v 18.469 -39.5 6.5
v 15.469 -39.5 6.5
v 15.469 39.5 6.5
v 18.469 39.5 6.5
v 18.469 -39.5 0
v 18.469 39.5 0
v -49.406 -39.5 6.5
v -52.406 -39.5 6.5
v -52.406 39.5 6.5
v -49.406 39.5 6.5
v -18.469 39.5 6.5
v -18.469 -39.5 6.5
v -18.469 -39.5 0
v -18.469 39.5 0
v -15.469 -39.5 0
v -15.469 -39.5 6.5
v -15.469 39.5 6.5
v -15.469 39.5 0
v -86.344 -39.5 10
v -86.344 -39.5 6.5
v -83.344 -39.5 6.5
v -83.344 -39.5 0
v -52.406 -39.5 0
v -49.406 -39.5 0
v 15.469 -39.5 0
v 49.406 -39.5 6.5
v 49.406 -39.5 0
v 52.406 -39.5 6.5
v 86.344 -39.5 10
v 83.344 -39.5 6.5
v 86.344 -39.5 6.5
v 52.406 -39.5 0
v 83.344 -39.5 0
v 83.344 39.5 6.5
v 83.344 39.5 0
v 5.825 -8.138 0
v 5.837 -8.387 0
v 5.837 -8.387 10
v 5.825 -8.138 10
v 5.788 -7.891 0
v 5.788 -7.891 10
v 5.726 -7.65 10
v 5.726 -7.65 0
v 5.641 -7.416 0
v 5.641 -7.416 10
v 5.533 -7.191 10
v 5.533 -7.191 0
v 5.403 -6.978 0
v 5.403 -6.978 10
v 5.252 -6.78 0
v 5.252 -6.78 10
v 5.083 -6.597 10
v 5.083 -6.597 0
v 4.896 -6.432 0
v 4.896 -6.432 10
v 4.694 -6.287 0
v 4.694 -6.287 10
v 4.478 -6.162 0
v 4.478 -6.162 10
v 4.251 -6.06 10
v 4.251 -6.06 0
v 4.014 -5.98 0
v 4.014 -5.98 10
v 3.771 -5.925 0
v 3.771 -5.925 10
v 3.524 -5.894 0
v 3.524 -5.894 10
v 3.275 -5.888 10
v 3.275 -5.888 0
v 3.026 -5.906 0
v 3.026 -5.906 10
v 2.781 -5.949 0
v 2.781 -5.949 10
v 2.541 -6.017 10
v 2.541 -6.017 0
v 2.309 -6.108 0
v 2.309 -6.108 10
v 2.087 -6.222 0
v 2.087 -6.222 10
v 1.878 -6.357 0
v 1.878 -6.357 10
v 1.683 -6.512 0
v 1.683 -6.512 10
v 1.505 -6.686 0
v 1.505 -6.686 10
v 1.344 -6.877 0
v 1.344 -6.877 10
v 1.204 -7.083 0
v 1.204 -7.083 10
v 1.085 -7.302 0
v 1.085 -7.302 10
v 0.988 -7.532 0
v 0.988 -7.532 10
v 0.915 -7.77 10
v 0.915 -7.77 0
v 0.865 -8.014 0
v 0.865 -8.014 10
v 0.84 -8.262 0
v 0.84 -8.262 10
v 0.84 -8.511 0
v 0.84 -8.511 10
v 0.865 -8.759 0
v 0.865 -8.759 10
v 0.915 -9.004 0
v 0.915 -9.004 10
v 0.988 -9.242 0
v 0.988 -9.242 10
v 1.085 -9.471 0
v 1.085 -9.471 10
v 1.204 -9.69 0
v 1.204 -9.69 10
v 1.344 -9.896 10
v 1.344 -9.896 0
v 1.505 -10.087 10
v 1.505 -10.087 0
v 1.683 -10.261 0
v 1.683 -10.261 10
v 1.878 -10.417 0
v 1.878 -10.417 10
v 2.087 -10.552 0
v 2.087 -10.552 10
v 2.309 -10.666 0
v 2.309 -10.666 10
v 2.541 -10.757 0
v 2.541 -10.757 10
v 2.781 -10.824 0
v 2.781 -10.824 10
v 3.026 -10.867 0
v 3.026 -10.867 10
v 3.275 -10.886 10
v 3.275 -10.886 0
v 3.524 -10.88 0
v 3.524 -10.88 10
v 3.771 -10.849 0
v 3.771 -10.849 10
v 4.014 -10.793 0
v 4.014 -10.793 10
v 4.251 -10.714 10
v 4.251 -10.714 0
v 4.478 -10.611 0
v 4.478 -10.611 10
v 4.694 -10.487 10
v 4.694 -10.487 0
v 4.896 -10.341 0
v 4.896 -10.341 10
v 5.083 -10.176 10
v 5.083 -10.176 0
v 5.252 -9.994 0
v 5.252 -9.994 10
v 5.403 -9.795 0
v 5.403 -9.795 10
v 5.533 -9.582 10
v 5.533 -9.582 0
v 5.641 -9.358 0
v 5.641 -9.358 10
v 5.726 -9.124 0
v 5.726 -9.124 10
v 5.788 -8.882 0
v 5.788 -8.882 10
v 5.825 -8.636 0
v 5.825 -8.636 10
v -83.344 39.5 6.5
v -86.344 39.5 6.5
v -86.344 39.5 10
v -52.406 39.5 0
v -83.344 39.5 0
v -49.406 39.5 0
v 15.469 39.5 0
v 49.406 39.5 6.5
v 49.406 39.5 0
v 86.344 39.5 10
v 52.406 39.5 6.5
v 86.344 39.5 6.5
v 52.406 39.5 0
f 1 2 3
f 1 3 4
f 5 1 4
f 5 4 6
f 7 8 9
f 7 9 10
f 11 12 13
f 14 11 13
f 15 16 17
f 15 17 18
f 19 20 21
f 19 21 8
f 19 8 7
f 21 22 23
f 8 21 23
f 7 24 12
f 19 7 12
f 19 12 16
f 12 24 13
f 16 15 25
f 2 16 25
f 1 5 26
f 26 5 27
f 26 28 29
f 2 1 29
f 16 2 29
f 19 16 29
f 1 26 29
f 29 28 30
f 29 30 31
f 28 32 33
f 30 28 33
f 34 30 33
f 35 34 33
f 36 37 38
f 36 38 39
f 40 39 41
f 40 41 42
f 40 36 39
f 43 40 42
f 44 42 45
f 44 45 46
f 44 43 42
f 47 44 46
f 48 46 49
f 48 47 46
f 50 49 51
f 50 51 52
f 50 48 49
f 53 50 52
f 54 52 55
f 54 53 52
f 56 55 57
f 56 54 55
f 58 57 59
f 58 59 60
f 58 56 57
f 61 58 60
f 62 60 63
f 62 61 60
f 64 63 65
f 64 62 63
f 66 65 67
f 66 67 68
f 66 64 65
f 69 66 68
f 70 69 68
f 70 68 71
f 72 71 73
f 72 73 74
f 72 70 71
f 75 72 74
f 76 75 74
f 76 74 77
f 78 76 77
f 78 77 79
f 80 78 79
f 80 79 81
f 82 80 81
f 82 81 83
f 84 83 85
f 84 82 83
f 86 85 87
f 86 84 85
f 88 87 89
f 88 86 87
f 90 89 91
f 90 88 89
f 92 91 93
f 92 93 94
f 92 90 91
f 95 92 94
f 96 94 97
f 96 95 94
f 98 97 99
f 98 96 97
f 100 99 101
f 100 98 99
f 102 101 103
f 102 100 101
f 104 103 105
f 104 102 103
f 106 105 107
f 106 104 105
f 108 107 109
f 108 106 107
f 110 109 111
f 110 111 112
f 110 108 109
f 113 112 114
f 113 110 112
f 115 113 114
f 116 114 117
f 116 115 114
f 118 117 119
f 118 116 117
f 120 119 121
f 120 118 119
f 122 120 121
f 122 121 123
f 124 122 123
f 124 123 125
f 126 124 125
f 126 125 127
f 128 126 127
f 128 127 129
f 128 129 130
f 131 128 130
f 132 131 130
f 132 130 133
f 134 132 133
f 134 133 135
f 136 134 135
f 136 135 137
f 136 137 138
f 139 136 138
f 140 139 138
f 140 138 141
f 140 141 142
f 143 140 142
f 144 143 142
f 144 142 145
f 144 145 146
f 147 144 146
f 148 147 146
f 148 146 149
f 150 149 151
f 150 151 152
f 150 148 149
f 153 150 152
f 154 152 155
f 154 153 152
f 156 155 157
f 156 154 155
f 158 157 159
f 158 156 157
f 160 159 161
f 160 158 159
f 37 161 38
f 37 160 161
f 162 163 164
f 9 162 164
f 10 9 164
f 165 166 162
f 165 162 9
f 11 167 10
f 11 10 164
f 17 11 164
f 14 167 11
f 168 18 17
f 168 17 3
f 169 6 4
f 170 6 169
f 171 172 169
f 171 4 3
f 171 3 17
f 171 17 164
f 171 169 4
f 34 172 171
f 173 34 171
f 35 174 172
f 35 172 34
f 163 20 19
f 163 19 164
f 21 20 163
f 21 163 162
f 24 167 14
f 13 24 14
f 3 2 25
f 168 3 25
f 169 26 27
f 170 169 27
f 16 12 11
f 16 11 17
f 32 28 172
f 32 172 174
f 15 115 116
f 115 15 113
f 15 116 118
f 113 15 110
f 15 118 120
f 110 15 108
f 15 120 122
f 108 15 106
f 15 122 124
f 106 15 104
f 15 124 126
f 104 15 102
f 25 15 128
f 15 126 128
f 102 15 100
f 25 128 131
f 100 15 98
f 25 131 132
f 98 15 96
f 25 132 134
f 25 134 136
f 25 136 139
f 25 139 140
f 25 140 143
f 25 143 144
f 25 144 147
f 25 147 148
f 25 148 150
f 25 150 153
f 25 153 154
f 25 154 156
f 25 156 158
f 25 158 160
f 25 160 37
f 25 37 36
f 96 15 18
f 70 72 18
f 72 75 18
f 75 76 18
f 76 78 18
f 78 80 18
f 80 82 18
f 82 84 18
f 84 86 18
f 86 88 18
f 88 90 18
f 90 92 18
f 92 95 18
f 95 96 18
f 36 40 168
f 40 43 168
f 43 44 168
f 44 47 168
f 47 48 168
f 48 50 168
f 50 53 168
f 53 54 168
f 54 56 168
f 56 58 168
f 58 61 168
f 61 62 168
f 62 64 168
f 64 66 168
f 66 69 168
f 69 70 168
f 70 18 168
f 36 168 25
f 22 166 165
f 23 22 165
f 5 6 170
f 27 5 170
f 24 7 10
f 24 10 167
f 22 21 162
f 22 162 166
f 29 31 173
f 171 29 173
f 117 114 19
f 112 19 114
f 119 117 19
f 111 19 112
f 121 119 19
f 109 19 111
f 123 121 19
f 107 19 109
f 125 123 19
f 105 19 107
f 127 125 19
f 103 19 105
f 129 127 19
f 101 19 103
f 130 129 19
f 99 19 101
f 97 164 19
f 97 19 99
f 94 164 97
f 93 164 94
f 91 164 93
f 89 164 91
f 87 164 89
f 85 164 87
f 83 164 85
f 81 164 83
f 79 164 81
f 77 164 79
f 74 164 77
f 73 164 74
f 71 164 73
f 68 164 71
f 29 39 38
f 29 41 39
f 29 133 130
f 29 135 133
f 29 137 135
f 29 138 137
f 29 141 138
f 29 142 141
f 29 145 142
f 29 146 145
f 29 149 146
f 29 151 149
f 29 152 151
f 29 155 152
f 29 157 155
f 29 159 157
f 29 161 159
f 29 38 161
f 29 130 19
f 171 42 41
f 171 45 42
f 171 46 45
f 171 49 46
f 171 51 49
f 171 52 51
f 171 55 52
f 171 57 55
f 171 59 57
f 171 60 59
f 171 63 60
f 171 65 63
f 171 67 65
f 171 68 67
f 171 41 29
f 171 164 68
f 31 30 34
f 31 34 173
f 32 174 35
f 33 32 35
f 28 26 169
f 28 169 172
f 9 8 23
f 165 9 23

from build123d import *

# Parameters (mm, degrees)
SKETCH1_W           = 172.688303012
SKETCH1_H           = 79
SKETCH1_R           = 2.5
BOSS_EXTRUDE1_DEPTH = 10
CUT_EXTRUDE1_REACH  = 81
SKETCH2_W           = 3
SKETCH2_H           = 6.5


with BuildPart() as part:
    # Sketch1 → Boss-Extrude1 (new body)
    with BuildSketch(Plane.XY):
        Rectangle(SKETCH1_W, SKETCH1_H)
        with Locations((3.337204705, -8.386778216)):
            Circle(SKETCH1_R, mode=Mode.SUBTRACT)
    extrude(amount=BOSS_EXTRUDE1_DEPTH)

    # Sketch2 → Cut-Extrude1 (cut, up to next)
    with BuildSketch(Plane(origin=(0, 39.5, 0), x_dir=(1, 0, 0), z_dir=(0, 1, 0)), mode=Mode.PRIVATE) as cut_extrude1_sk1:
        with Locations((84.844151506, -3.25)):
            Rectangle(SKETCH2_W, SKETCH2_H)
    cut_extrude1_tool1 = extrude(cut_extrude1_sk1.sketch, amount=-CUT_EXTRUDE1_REACH, mode=Mode.PRIVATE) & part.part
    add(cut_extrude1_tool1.solids().sort_by_distance((84.844152, 39.5, 3.25))[0], mode=Mode.SUBTRACT)
    # Sketch2 → Cut-Extrude1 (cut, up to next)
    with BuildSketch(Plane(origin=(0, 39.5, 0), x_dir=(1, 0, 0), z_dir=(0, 1, 0)), mode=Mode.PRIVATE) as cut_extrude1_sk2:
        with Locations((50.906490903, -3.25)):
            Rectangle(SKETCH2_W, SKETCH2_H)
    cut_extrude1_tool2 = extrude(cut_extrude1_sk2.sketch, amount=-CUT_EXTRUDE1_REACH, mode=Mode.PRIVATE) & part.part
    add(cut_extrude1_tool2.solids().sort_by_distance((50.906491, 39.5, 3.25))[0], mode=Mode.SUBTRACT)
    # Sketch2 → Cut-Extrude1 (cut, up to next)
    with BuildSketch(Plane(origin=(0, 39.5, 0), x_dir=(1, 0, 0), z_dir=(0, 1, 0)), mode=Mode.PRIVATE) as cut_extrude1_sk3:
        with Locations((16.968830301, -3.25)):
            Rectangle(SKETCH2_W, SKETCH2_H)
    cut_extrude1_tool3 = extrude(cut_extrude1_sk3.sketch, amount=-CUT_EXTRUDE1_REACH, mode=Mode.PRIVATE) & part.part
    add(cut_extrude1_tool3.solids().sort_by_distance((16.96883, 39.5, 3.25))[0], mode=Mode.SUBTRACT)
    # Sketch2 → Cut-Extrude1 (cut, up to next)
    with BuildSketch(Plane(origin=(0, 39.5, 0), x_dir=(1, 0, 0), z_dir=(0, 1, 0)), mode=Mode.PRIVATE) as cut_extrude1_sk4:
        with Locations((-16.968830301, -3.25)):
            Rectangle(SKETCH2_W, SKETCH2_H)
    cut_extrude1_tool4 = extrude(cut_extrude1_sk4.sketch, amount=-CUT_EXTRUDE1_REACH, mode=Mode.PRIVATE) & part.part
    add(cut_extrude1_tool4.solids().sort_by_distance((-16.96883, 39.5, 3.25))[0], mode=Mode.SUBTRACT)
    # Sketch2 → Cut-Extrude1 (cut, up to next)
    with BuildSketch(Plane(origin=(0, 39.5, 0), x_dir=(1, 0, 0), z_dir=(0, 1, 0)), mode=Mode.PRIVATE) as cut_extrude1_sk5:
        with Locations((-50.906490903, -3.25)):
            Rectangle(SKETCH2_W, SKETCH2_H)
    cut_extrude1_tool5 = extrude(cut_extrude1_sk5.sketch, amount=-CUT_EXTRUDE1_REACH, mode=Mode.PRIVATE) & part.part
    add(cut_extrude1_tool5.solids().sort_by_distance((-50.906491, 39.5, 3.25))[0], mode=Mode.SUBTRACT)
    # Sketch2 → Cut-Extrude1 (cut, up to next)
    with BuildSketch(Plane(origin=(0, 39.5, 0), x_dir=(1, 0, 0), z_dir=(0, 1, 0)), mode=Mode.PRIVATE) as cut_extrude1_sk6:
        with Locations((-84.844151506, -3.25)):
            Rectangle(SKETCH2_W, SKETCH2_H)
    cut_extrude1_tool6 = extrude(cut_extrude1_sk6.sketch, amount=-CUT_EXTRUDE1_REACH, mode=Mode.PRIVATE) & part.part
    add(cut_extrude1_tool6.solids().sort_by_distance((-84.844152, 39.5, 3.25))[0], mode=Mode.SUBTRACT)


solid = part.part
